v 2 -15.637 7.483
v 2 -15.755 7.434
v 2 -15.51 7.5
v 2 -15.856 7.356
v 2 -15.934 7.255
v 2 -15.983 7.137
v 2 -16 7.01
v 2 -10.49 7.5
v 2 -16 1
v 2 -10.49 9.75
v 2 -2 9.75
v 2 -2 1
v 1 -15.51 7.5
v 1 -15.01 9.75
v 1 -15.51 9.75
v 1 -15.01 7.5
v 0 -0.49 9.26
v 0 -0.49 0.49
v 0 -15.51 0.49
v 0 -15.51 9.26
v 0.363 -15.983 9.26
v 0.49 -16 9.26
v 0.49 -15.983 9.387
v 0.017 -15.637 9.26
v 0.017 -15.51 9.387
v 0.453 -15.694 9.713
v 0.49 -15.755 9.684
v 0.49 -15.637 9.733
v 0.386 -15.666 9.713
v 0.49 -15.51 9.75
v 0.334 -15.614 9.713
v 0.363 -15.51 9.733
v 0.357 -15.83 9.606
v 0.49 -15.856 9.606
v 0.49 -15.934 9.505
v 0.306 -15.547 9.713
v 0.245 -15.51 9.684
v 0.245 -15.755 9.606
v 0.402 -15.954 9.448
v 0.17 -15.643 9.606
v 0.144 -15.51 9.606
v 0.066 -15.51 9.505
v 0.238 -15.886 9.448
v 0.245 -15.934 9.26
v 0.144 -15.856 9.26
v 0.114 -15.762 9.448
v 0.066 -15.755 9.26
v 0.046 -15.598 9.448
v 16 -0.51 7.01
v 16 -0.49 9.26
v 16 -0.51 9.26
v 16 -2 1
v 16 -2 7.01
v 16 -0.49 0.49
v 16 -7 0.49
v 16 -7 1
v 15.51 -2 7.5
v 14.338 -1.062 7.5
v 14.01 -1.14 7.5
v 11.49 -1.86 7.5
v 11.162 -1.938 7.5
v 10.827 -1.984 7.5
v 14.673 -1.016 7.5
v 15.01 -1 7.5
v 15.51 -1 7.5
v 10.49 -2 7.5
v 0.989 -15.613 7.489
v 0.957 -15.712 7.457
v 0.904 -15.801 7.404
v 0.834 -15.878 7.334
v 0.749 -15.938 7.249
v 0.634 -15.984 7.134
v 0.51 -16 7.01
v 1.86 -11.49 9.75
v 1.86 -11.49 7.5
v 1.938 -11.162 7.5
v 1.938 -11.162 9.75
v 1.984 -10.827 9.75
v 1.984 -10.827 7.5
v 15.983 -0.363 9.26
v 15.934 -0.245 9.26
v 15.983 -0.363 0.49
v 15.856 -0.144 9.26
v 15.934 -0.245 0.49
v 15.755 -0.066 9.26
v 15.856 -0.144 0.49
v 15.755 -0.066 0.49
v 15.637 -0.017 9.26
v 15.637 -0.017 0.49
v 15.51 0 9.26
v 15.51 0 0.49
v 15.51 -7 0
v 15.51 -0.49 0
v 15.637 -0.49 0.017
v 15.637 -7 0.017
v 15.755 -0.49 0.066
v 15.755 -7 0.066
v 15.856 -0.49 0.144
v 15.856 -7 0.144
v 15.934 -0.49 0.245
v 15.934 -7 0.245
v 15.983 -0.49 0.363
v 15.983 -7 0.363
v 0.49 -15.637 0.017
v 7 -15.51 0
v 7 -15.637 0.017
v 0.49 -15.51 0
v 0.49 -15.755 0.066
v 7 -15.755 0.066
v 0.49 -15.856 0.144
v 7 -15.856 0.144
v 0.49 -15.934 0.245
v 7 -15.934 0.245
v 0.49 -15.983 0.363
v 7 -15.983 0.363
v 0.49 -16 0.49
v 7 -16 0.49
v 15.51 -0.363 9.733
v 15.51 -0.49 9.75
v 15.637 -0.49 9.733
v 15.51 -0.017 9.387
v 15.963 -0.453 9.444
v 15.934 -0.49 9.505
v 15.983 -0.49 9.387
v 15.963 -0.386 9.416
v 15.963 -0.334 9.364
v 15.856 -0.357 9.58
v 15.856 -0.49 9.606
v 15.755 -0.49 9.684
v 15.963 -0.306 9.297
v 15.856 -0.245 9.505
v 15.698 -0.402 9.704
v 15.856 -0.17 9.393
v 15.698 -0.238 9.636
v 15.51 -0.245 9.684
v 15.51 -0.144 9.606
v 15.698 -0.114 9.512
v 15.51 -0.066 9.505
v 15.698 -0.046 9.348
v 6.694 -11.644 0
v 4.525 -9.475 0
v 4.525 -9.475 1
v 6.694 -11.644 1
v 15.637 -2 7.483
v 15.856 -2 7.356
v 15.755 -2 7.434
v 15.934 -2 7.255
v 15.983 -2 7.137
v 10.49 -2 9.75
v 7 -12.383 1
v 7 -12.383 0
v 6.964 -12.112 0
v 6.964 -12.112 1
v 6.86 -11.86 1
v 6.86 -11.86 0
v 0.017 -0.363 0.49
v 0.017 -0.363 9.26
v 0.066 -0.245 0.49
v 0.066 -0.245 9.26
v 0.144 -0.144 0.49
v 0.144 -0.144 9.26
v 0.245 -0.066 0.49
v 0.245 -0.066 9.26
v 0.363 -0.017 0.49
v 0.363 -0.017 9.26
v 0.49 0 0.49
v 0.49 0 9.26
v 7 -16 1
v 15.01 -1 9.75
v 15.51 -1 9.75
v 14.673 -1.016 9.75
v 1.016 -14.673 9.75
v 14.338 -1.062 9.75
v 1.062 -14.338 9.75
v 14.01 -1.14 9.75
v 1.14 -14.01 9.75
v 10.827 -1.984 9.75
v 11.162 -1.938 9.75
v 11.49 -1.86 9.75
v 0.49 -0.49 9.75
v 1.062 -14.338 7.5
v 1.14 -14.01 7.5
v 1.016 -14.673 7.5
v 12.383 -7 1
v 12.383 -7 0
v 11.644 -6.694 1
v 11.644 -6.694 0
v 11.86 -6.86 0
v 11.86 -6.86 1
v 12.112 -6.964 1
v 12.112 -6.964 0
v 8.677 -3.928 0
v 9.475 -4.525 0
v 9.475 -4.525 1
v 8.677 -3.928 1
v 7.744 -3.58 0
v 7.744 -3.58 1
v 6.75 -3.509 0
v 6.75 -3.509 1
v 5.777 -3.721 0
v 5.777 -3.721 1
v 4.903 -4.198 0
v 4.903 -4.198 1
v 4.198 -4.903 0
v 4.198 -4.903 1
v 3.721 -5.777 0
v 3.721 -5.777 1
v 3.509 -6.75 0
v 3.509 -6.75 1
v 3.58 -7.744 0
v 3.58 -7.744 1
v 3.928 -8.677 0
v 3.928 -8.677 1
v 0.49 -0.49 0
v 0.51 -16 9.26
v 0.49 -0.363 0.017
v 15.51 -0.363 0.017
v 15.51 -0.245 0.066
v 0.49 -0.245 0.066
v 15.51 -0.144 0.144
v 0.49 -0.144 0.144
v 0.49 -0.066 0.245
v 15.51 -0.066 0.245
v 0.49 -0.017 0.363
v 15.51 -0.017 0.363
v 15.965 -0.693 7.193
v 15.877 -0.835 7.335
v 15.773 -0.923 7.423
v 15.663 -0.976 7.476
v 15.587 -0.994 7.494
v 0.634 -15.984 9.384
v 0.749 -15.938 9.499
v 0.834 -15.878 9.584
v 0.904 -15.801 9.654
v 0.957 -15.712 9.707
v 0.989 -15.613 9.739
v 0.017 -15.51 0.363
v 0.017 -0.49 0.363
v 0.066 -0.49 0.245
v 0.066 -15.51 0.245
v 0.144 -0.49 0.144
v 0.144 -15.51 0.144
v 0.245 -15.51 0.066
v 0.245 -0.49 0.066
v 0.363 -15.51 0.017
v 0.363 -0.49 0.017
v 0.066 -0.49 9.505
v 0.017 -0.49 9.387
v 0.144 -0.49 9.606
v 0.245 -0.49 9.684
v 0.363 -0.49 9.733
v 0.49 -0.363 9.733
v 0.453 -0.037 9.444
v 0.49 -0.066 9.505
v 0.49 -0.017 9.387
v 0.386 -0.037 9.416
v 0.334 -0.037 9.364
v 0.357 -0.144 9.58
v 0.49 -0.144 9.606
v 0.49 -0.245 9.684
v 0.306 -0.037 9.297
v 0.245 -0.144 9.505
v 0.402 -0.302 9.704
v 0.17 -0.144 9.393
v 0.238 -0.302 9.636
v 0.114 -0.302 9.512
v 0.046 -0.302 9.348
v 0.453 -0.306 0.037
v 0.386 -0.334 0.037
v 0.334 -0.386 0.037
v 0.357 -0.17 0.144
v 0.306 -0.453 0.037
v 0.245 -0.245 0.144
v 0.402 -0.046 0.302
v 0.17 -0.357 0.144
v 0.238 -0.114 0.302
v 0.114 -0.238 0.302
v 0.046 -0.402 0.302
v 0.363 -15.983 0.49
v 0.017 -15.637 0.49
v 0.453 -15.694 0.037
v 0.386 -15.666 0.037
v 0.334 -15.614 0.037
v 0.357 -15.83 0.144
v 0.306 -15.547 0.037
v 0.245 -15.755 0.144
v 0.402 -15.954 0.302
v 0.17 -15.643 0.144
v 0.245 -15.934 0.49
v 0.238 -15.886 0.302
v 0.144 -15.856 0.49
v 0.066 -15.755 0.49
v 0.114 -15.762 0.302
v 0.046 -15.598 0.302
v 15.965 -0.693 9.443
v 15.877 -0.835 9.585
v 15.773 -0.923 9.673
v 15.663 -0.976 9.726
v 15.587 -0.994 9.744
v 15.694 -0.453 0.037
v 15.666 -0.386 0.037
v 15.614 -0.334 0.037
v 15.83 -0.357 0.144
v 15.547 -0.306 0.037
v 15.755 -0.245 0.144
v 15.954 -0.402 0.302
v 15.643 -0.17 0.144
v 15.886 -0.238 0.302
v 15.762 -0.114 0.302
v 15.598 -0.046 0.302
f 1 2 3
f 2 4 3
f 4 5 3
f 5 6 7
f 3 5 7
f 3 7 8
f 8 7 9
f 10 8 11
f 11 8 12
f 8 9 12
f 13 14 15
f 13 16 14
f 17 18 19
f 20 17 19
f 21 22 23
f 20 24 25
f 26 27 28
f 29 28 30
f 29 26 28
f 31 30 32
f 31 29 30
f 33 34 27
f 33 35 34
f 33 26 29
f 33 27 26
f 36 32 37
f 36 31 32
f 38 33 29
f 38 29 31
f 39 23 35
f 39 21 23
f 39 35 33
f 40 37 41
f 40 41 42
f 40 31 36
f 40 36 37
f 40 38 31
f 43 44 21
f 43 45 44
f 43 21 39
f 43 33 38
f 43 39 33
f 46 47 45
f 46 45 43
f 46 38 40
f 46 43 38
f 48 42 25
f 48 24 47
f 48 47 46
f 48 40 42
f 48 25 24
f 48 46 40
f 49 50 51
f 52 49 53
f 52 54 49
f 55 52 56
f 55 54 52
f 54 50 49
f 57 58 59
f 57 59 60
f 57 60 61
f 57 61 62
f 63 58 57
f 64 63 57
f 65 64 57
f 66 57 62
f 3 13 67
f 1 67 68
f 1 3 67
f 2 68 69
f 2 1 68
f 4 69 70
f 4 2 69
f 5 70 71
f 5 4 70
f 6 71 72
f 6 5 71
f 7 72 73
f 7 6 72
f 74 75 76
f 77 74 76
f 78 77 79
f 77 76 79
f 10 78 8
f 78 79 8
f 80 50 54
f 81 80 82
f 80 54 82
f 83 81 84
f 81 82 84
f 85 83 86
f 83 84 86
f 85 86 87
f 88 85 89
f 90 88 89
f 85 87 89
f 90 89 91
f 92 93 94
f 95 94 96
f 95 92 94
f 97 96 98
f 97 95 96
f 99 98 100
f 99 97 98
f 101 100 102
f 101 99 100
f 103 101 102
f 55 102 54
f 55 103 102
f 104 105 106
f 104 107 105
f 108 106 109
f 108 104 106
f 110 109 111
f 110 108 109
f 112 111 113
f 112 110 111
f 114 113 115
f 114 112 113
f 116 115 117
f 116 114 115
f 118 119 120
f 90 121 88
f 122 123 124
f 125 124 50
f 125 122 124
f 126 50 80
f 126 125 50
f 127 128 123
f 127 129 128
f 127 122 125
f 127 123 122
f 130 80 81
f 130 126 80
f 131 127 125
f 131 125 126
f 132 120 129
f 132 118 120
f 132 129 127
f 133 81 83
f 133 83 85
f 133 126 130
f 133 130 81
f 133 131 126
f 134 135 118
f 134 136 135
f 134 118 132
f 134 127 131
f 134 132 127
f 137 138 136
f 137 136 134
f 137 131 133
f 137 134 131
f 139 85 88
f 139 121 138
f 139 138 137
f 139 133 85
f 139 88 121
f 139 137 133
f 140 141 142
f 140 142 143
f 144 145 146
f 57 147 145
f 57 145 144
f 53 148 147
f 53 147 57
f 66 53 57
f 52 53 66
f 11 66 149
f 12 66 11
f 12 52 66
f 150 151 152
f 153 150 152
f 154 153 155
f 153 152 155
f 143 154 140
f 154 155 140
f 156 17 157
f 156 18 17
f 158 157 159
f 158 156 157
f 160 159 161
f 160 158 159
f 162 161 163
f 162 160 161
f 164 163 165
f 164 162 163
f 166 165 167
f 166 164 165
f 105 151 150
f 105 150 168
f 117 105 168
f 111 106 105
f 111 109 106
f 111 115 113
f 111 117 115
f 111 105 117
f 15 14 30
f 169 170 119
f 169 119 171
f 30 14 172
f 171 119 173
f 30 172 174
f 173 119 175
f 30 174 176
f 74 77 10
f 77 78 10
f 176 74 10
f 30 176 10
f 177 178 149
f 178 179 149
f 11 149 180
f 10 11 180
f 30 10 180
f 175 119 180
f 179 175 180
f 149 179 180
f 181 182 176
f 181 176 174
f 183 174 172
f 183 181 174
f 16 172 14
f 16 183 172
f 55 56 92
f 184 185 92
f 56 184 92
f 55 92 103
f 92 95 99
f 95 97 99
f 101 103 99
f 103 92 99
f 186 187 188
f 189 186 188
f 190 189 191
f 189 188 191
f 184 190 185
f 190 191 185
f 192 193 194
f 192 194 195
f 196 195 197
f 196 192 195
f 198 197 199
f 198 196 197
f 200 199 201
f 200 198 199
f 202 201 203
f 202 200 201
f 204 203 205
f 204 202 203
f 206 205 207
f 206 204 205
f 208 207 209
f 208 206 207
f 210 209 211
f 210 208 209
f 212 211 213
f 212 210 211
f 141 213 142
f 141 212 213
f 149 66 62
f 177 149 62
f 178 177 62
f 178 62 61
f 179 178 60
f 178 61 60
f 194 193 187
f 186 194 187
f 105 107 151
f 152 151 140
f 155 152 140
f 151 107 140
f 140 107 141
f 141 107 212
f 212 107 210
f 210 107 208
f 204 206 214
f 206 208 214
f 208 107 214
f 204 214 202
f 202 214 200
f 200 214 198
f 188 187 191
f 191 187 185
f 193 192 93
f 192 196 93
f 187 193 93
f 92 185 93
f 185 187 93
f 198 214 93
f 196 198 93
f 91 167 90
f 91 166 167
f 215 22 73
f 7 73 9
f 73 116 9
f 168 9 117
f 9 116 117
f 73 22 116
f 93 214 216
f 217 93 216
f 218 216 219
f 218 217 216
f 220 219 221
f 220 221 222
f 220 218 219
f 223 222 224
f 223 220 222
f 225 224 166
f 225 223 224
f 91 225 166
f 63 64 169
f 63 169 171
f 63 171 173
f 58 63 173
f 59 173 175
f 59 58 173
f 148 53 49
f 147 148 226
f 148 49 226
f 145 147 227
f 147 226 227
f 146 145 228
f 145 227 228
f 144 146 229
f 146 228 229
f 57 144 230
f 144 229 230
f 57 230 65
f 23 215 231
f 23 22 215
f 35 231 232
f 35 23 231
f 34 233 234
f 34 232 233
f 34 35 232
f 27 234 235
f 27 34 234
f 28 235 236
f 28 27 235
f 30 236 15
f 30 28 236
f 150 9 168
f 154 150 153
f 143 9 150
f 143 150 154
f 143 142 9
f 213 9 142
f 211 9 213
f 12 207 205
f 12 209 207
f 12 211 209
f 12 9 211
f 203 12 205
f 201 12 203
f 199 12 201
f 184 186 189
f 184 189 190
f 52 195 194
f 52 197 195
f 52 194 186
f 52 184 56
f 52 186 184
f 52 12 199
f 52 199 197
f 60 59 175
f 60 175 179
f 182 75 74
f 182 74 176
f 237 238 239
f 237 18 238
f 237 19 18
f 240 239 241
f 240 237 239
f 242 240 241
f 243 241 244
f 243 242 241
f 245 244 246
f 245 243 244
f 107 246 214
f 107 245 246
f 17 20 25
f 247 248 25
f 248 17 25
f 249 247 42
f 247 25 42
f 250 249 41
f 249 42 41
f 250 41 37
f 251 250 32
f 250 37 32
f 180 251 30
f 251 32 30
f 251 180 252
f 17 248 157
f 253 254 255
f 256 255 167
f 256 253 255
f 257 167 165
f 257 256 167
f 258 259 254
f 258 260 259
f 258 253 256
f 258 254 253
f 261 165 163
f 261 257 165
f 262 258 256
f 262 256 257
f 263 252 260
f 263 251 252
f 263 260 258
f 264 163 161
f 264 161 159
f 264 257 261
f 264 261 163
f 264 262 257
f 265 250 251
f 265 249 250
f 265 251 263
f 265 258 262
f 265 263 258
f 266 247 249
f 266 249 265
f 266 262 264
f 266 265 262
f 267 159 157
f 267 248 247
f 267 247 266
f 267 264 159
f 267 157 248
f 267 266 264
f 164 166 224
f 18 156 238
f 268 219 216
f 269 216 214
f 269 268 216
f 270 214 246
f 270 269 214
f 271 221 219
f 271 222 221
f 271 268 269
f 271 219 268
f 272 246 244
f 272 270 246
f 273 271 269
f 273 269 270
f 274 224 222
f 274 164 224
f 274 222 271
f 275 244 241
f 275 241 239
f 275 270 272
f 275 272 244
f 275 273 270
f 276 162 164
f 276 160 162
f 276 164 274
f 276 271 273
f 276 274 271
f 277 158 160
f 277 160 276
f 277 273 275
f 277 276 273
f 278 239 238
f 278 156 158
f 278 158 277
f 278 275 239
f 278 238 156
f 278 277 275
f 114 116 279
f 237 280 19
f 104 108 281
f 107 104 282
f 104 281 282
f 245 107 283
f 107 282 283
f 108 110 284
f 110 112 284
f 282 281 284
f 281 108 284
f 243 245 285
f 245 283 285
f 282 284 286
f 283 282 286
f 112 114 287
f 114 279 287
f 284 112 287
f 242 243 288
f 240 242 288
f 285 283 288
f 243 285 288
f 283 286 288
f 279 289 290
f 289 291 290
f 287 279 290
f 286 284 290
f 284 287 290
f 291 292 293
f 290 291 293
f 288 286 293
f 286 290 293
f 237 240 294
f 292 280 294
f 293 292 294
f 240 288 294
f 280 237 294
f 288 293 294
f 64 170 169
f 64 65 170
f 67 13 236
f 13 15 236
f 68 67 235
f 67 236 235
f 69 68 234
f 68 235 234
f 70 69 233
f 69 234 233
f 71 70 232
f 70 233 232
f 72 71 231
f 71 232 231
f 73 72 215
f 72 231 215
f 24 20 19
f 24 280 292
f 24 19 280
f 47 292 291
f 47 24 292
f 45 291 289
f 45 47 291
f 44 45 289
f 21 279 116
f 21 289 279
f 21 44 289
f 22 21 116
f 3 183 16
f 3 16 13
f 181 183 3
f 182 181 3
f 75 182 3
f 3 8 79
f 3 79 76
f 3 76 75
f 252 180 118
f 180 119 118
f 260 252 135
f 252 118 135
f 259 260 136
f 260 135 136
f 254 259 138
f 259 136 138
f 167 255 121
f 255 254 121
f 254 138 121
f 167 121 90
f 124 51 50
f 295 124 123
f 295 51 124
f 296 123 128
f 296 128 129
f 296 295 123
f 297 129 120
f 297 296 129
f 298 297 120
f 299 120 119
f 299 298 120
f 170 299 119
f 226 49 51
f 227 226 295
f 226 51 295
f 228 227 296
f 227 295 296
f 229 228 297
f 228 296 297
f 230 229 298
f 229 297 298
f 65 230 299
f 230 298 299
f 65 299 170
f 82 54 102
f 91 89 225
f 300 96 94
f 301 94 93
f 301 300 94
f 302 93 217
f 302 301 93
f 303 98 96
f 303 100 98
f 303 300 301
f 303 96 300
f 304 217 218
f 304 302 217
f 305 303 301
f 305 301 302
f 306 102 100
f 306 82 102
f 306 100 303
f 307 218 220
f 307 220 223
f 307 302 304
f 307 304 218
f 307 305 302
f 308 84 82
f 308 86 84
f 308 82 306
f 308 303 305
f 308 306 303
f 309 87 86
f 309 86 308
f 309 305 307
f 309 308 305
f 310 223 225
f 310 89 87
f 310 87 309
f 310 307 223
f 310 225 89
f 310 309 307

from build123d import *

# Parameters (mm, degrees)
PAD_DEPTH    = 1
PAD001_DEPTH = 9.75
PAD002_DEPTH = 7.5
FILLET_R     = 0.49


with BuildPart() as part:
    # Sketch → Pad (new body)
    with BuildSketch(Plane.XY):
        with BuildLine():
            Line((0, 0), (0, -16))
            Line((0, -16), (7, -16))
            Line((7, -12.382704), (7, -16))
            ThreePointArc((7, -12.382704), (6.920435, -11.982704), (6.693853, -11.643601))
            Line((4.525126, -9.474874), (6.693853, -11.643601))
            ThreePointArc((9.474875, -4.525127), (4.525127, -4.525126), (4.525126, -9.474874))
            Line((9.474875, -4.525127), (11.643599, -6.693853))
            ThreePointArc((11.643599, -6.693853), (11.982703, -6.920435), (12.382703, -7))
            Line((12.382703, -7), (16, -7))
            Line((16, 0), (16, -7))
            Line((0, 0), (16, 0))
        make_face()
    extrude(amount=PAD_DEPTH)

    # Sketch001 (on XY_Plane of Origin) → Pad001 (join)
    with BuildSketch(Plane.XY):
        with BuildLine():
            Line((0, 0), (16, 0))
            Line((16, 0), (16, -1))
            Line((16, -1), (15.009808, -1))
            ThreePointArc((15.009808, -1), (14.504928, -1.035184), (14.009808, -1.140055))
            Line((14.009808, -1.140055), (11.490192, -1.859945))
            ThreePointArc((10.490192, -2), (10.995072, -1.964816), (11.490192, -1.859945))
            Line((10.490192, -2), (2, -2))
            Line((2, -2), (2, -10.490192))
            ThreePointArc((1.859945, -11.490192), (1.964816, -10.995072), (2, -10.490192))
            Line((1.859945, -11.490192), (1.140055, -14.009808))
            ThreePointArc((1.140055, -14.009808), (1.035184, -14.504928), (1, -15.009808))
            Line((1, -15.009808), (1, -16))
            Line((1, -16), (0, -16))
            Line((0, 0), (0, -16))
        make_face()
    extrude(amount=PAD001_DEPTH)

    # Sketch002 (on XY_Plane of Origin) → Pad002 (join)
    with BuildSketch(Plane.XY):
        Polygon((16, -2), (16, 0), (0, 0), (0, -16), (2, -16), (2, -2), align=None)
    extrude(amount=PAD002_DEPTH)

    # Fillet
    fillet_edges = [part.edges().sort_by_distance(p)[0] for p in [
        (1.5, -16, 7.5),
        (1, -16, 8.625),
        (0, -16, 4.875),
        (0.5, -16, 9.75),
        (0, -8, 9.75),
        (8, 0, 9.75),
        (16, -1, 8.625),
        (16, -0.5, 9.75),
        (16, 0, 4.875),
        (16, -1.5, 7.5),
        (0, 0, 4.875),
        (3.5, -16, 0),
        (16, -3.5, 0),
        (8, 0, 0),
        (0, -8, 0),
    ]]
    fillet(fillet_edges, radius=FILLET_R)


solid = part.part
